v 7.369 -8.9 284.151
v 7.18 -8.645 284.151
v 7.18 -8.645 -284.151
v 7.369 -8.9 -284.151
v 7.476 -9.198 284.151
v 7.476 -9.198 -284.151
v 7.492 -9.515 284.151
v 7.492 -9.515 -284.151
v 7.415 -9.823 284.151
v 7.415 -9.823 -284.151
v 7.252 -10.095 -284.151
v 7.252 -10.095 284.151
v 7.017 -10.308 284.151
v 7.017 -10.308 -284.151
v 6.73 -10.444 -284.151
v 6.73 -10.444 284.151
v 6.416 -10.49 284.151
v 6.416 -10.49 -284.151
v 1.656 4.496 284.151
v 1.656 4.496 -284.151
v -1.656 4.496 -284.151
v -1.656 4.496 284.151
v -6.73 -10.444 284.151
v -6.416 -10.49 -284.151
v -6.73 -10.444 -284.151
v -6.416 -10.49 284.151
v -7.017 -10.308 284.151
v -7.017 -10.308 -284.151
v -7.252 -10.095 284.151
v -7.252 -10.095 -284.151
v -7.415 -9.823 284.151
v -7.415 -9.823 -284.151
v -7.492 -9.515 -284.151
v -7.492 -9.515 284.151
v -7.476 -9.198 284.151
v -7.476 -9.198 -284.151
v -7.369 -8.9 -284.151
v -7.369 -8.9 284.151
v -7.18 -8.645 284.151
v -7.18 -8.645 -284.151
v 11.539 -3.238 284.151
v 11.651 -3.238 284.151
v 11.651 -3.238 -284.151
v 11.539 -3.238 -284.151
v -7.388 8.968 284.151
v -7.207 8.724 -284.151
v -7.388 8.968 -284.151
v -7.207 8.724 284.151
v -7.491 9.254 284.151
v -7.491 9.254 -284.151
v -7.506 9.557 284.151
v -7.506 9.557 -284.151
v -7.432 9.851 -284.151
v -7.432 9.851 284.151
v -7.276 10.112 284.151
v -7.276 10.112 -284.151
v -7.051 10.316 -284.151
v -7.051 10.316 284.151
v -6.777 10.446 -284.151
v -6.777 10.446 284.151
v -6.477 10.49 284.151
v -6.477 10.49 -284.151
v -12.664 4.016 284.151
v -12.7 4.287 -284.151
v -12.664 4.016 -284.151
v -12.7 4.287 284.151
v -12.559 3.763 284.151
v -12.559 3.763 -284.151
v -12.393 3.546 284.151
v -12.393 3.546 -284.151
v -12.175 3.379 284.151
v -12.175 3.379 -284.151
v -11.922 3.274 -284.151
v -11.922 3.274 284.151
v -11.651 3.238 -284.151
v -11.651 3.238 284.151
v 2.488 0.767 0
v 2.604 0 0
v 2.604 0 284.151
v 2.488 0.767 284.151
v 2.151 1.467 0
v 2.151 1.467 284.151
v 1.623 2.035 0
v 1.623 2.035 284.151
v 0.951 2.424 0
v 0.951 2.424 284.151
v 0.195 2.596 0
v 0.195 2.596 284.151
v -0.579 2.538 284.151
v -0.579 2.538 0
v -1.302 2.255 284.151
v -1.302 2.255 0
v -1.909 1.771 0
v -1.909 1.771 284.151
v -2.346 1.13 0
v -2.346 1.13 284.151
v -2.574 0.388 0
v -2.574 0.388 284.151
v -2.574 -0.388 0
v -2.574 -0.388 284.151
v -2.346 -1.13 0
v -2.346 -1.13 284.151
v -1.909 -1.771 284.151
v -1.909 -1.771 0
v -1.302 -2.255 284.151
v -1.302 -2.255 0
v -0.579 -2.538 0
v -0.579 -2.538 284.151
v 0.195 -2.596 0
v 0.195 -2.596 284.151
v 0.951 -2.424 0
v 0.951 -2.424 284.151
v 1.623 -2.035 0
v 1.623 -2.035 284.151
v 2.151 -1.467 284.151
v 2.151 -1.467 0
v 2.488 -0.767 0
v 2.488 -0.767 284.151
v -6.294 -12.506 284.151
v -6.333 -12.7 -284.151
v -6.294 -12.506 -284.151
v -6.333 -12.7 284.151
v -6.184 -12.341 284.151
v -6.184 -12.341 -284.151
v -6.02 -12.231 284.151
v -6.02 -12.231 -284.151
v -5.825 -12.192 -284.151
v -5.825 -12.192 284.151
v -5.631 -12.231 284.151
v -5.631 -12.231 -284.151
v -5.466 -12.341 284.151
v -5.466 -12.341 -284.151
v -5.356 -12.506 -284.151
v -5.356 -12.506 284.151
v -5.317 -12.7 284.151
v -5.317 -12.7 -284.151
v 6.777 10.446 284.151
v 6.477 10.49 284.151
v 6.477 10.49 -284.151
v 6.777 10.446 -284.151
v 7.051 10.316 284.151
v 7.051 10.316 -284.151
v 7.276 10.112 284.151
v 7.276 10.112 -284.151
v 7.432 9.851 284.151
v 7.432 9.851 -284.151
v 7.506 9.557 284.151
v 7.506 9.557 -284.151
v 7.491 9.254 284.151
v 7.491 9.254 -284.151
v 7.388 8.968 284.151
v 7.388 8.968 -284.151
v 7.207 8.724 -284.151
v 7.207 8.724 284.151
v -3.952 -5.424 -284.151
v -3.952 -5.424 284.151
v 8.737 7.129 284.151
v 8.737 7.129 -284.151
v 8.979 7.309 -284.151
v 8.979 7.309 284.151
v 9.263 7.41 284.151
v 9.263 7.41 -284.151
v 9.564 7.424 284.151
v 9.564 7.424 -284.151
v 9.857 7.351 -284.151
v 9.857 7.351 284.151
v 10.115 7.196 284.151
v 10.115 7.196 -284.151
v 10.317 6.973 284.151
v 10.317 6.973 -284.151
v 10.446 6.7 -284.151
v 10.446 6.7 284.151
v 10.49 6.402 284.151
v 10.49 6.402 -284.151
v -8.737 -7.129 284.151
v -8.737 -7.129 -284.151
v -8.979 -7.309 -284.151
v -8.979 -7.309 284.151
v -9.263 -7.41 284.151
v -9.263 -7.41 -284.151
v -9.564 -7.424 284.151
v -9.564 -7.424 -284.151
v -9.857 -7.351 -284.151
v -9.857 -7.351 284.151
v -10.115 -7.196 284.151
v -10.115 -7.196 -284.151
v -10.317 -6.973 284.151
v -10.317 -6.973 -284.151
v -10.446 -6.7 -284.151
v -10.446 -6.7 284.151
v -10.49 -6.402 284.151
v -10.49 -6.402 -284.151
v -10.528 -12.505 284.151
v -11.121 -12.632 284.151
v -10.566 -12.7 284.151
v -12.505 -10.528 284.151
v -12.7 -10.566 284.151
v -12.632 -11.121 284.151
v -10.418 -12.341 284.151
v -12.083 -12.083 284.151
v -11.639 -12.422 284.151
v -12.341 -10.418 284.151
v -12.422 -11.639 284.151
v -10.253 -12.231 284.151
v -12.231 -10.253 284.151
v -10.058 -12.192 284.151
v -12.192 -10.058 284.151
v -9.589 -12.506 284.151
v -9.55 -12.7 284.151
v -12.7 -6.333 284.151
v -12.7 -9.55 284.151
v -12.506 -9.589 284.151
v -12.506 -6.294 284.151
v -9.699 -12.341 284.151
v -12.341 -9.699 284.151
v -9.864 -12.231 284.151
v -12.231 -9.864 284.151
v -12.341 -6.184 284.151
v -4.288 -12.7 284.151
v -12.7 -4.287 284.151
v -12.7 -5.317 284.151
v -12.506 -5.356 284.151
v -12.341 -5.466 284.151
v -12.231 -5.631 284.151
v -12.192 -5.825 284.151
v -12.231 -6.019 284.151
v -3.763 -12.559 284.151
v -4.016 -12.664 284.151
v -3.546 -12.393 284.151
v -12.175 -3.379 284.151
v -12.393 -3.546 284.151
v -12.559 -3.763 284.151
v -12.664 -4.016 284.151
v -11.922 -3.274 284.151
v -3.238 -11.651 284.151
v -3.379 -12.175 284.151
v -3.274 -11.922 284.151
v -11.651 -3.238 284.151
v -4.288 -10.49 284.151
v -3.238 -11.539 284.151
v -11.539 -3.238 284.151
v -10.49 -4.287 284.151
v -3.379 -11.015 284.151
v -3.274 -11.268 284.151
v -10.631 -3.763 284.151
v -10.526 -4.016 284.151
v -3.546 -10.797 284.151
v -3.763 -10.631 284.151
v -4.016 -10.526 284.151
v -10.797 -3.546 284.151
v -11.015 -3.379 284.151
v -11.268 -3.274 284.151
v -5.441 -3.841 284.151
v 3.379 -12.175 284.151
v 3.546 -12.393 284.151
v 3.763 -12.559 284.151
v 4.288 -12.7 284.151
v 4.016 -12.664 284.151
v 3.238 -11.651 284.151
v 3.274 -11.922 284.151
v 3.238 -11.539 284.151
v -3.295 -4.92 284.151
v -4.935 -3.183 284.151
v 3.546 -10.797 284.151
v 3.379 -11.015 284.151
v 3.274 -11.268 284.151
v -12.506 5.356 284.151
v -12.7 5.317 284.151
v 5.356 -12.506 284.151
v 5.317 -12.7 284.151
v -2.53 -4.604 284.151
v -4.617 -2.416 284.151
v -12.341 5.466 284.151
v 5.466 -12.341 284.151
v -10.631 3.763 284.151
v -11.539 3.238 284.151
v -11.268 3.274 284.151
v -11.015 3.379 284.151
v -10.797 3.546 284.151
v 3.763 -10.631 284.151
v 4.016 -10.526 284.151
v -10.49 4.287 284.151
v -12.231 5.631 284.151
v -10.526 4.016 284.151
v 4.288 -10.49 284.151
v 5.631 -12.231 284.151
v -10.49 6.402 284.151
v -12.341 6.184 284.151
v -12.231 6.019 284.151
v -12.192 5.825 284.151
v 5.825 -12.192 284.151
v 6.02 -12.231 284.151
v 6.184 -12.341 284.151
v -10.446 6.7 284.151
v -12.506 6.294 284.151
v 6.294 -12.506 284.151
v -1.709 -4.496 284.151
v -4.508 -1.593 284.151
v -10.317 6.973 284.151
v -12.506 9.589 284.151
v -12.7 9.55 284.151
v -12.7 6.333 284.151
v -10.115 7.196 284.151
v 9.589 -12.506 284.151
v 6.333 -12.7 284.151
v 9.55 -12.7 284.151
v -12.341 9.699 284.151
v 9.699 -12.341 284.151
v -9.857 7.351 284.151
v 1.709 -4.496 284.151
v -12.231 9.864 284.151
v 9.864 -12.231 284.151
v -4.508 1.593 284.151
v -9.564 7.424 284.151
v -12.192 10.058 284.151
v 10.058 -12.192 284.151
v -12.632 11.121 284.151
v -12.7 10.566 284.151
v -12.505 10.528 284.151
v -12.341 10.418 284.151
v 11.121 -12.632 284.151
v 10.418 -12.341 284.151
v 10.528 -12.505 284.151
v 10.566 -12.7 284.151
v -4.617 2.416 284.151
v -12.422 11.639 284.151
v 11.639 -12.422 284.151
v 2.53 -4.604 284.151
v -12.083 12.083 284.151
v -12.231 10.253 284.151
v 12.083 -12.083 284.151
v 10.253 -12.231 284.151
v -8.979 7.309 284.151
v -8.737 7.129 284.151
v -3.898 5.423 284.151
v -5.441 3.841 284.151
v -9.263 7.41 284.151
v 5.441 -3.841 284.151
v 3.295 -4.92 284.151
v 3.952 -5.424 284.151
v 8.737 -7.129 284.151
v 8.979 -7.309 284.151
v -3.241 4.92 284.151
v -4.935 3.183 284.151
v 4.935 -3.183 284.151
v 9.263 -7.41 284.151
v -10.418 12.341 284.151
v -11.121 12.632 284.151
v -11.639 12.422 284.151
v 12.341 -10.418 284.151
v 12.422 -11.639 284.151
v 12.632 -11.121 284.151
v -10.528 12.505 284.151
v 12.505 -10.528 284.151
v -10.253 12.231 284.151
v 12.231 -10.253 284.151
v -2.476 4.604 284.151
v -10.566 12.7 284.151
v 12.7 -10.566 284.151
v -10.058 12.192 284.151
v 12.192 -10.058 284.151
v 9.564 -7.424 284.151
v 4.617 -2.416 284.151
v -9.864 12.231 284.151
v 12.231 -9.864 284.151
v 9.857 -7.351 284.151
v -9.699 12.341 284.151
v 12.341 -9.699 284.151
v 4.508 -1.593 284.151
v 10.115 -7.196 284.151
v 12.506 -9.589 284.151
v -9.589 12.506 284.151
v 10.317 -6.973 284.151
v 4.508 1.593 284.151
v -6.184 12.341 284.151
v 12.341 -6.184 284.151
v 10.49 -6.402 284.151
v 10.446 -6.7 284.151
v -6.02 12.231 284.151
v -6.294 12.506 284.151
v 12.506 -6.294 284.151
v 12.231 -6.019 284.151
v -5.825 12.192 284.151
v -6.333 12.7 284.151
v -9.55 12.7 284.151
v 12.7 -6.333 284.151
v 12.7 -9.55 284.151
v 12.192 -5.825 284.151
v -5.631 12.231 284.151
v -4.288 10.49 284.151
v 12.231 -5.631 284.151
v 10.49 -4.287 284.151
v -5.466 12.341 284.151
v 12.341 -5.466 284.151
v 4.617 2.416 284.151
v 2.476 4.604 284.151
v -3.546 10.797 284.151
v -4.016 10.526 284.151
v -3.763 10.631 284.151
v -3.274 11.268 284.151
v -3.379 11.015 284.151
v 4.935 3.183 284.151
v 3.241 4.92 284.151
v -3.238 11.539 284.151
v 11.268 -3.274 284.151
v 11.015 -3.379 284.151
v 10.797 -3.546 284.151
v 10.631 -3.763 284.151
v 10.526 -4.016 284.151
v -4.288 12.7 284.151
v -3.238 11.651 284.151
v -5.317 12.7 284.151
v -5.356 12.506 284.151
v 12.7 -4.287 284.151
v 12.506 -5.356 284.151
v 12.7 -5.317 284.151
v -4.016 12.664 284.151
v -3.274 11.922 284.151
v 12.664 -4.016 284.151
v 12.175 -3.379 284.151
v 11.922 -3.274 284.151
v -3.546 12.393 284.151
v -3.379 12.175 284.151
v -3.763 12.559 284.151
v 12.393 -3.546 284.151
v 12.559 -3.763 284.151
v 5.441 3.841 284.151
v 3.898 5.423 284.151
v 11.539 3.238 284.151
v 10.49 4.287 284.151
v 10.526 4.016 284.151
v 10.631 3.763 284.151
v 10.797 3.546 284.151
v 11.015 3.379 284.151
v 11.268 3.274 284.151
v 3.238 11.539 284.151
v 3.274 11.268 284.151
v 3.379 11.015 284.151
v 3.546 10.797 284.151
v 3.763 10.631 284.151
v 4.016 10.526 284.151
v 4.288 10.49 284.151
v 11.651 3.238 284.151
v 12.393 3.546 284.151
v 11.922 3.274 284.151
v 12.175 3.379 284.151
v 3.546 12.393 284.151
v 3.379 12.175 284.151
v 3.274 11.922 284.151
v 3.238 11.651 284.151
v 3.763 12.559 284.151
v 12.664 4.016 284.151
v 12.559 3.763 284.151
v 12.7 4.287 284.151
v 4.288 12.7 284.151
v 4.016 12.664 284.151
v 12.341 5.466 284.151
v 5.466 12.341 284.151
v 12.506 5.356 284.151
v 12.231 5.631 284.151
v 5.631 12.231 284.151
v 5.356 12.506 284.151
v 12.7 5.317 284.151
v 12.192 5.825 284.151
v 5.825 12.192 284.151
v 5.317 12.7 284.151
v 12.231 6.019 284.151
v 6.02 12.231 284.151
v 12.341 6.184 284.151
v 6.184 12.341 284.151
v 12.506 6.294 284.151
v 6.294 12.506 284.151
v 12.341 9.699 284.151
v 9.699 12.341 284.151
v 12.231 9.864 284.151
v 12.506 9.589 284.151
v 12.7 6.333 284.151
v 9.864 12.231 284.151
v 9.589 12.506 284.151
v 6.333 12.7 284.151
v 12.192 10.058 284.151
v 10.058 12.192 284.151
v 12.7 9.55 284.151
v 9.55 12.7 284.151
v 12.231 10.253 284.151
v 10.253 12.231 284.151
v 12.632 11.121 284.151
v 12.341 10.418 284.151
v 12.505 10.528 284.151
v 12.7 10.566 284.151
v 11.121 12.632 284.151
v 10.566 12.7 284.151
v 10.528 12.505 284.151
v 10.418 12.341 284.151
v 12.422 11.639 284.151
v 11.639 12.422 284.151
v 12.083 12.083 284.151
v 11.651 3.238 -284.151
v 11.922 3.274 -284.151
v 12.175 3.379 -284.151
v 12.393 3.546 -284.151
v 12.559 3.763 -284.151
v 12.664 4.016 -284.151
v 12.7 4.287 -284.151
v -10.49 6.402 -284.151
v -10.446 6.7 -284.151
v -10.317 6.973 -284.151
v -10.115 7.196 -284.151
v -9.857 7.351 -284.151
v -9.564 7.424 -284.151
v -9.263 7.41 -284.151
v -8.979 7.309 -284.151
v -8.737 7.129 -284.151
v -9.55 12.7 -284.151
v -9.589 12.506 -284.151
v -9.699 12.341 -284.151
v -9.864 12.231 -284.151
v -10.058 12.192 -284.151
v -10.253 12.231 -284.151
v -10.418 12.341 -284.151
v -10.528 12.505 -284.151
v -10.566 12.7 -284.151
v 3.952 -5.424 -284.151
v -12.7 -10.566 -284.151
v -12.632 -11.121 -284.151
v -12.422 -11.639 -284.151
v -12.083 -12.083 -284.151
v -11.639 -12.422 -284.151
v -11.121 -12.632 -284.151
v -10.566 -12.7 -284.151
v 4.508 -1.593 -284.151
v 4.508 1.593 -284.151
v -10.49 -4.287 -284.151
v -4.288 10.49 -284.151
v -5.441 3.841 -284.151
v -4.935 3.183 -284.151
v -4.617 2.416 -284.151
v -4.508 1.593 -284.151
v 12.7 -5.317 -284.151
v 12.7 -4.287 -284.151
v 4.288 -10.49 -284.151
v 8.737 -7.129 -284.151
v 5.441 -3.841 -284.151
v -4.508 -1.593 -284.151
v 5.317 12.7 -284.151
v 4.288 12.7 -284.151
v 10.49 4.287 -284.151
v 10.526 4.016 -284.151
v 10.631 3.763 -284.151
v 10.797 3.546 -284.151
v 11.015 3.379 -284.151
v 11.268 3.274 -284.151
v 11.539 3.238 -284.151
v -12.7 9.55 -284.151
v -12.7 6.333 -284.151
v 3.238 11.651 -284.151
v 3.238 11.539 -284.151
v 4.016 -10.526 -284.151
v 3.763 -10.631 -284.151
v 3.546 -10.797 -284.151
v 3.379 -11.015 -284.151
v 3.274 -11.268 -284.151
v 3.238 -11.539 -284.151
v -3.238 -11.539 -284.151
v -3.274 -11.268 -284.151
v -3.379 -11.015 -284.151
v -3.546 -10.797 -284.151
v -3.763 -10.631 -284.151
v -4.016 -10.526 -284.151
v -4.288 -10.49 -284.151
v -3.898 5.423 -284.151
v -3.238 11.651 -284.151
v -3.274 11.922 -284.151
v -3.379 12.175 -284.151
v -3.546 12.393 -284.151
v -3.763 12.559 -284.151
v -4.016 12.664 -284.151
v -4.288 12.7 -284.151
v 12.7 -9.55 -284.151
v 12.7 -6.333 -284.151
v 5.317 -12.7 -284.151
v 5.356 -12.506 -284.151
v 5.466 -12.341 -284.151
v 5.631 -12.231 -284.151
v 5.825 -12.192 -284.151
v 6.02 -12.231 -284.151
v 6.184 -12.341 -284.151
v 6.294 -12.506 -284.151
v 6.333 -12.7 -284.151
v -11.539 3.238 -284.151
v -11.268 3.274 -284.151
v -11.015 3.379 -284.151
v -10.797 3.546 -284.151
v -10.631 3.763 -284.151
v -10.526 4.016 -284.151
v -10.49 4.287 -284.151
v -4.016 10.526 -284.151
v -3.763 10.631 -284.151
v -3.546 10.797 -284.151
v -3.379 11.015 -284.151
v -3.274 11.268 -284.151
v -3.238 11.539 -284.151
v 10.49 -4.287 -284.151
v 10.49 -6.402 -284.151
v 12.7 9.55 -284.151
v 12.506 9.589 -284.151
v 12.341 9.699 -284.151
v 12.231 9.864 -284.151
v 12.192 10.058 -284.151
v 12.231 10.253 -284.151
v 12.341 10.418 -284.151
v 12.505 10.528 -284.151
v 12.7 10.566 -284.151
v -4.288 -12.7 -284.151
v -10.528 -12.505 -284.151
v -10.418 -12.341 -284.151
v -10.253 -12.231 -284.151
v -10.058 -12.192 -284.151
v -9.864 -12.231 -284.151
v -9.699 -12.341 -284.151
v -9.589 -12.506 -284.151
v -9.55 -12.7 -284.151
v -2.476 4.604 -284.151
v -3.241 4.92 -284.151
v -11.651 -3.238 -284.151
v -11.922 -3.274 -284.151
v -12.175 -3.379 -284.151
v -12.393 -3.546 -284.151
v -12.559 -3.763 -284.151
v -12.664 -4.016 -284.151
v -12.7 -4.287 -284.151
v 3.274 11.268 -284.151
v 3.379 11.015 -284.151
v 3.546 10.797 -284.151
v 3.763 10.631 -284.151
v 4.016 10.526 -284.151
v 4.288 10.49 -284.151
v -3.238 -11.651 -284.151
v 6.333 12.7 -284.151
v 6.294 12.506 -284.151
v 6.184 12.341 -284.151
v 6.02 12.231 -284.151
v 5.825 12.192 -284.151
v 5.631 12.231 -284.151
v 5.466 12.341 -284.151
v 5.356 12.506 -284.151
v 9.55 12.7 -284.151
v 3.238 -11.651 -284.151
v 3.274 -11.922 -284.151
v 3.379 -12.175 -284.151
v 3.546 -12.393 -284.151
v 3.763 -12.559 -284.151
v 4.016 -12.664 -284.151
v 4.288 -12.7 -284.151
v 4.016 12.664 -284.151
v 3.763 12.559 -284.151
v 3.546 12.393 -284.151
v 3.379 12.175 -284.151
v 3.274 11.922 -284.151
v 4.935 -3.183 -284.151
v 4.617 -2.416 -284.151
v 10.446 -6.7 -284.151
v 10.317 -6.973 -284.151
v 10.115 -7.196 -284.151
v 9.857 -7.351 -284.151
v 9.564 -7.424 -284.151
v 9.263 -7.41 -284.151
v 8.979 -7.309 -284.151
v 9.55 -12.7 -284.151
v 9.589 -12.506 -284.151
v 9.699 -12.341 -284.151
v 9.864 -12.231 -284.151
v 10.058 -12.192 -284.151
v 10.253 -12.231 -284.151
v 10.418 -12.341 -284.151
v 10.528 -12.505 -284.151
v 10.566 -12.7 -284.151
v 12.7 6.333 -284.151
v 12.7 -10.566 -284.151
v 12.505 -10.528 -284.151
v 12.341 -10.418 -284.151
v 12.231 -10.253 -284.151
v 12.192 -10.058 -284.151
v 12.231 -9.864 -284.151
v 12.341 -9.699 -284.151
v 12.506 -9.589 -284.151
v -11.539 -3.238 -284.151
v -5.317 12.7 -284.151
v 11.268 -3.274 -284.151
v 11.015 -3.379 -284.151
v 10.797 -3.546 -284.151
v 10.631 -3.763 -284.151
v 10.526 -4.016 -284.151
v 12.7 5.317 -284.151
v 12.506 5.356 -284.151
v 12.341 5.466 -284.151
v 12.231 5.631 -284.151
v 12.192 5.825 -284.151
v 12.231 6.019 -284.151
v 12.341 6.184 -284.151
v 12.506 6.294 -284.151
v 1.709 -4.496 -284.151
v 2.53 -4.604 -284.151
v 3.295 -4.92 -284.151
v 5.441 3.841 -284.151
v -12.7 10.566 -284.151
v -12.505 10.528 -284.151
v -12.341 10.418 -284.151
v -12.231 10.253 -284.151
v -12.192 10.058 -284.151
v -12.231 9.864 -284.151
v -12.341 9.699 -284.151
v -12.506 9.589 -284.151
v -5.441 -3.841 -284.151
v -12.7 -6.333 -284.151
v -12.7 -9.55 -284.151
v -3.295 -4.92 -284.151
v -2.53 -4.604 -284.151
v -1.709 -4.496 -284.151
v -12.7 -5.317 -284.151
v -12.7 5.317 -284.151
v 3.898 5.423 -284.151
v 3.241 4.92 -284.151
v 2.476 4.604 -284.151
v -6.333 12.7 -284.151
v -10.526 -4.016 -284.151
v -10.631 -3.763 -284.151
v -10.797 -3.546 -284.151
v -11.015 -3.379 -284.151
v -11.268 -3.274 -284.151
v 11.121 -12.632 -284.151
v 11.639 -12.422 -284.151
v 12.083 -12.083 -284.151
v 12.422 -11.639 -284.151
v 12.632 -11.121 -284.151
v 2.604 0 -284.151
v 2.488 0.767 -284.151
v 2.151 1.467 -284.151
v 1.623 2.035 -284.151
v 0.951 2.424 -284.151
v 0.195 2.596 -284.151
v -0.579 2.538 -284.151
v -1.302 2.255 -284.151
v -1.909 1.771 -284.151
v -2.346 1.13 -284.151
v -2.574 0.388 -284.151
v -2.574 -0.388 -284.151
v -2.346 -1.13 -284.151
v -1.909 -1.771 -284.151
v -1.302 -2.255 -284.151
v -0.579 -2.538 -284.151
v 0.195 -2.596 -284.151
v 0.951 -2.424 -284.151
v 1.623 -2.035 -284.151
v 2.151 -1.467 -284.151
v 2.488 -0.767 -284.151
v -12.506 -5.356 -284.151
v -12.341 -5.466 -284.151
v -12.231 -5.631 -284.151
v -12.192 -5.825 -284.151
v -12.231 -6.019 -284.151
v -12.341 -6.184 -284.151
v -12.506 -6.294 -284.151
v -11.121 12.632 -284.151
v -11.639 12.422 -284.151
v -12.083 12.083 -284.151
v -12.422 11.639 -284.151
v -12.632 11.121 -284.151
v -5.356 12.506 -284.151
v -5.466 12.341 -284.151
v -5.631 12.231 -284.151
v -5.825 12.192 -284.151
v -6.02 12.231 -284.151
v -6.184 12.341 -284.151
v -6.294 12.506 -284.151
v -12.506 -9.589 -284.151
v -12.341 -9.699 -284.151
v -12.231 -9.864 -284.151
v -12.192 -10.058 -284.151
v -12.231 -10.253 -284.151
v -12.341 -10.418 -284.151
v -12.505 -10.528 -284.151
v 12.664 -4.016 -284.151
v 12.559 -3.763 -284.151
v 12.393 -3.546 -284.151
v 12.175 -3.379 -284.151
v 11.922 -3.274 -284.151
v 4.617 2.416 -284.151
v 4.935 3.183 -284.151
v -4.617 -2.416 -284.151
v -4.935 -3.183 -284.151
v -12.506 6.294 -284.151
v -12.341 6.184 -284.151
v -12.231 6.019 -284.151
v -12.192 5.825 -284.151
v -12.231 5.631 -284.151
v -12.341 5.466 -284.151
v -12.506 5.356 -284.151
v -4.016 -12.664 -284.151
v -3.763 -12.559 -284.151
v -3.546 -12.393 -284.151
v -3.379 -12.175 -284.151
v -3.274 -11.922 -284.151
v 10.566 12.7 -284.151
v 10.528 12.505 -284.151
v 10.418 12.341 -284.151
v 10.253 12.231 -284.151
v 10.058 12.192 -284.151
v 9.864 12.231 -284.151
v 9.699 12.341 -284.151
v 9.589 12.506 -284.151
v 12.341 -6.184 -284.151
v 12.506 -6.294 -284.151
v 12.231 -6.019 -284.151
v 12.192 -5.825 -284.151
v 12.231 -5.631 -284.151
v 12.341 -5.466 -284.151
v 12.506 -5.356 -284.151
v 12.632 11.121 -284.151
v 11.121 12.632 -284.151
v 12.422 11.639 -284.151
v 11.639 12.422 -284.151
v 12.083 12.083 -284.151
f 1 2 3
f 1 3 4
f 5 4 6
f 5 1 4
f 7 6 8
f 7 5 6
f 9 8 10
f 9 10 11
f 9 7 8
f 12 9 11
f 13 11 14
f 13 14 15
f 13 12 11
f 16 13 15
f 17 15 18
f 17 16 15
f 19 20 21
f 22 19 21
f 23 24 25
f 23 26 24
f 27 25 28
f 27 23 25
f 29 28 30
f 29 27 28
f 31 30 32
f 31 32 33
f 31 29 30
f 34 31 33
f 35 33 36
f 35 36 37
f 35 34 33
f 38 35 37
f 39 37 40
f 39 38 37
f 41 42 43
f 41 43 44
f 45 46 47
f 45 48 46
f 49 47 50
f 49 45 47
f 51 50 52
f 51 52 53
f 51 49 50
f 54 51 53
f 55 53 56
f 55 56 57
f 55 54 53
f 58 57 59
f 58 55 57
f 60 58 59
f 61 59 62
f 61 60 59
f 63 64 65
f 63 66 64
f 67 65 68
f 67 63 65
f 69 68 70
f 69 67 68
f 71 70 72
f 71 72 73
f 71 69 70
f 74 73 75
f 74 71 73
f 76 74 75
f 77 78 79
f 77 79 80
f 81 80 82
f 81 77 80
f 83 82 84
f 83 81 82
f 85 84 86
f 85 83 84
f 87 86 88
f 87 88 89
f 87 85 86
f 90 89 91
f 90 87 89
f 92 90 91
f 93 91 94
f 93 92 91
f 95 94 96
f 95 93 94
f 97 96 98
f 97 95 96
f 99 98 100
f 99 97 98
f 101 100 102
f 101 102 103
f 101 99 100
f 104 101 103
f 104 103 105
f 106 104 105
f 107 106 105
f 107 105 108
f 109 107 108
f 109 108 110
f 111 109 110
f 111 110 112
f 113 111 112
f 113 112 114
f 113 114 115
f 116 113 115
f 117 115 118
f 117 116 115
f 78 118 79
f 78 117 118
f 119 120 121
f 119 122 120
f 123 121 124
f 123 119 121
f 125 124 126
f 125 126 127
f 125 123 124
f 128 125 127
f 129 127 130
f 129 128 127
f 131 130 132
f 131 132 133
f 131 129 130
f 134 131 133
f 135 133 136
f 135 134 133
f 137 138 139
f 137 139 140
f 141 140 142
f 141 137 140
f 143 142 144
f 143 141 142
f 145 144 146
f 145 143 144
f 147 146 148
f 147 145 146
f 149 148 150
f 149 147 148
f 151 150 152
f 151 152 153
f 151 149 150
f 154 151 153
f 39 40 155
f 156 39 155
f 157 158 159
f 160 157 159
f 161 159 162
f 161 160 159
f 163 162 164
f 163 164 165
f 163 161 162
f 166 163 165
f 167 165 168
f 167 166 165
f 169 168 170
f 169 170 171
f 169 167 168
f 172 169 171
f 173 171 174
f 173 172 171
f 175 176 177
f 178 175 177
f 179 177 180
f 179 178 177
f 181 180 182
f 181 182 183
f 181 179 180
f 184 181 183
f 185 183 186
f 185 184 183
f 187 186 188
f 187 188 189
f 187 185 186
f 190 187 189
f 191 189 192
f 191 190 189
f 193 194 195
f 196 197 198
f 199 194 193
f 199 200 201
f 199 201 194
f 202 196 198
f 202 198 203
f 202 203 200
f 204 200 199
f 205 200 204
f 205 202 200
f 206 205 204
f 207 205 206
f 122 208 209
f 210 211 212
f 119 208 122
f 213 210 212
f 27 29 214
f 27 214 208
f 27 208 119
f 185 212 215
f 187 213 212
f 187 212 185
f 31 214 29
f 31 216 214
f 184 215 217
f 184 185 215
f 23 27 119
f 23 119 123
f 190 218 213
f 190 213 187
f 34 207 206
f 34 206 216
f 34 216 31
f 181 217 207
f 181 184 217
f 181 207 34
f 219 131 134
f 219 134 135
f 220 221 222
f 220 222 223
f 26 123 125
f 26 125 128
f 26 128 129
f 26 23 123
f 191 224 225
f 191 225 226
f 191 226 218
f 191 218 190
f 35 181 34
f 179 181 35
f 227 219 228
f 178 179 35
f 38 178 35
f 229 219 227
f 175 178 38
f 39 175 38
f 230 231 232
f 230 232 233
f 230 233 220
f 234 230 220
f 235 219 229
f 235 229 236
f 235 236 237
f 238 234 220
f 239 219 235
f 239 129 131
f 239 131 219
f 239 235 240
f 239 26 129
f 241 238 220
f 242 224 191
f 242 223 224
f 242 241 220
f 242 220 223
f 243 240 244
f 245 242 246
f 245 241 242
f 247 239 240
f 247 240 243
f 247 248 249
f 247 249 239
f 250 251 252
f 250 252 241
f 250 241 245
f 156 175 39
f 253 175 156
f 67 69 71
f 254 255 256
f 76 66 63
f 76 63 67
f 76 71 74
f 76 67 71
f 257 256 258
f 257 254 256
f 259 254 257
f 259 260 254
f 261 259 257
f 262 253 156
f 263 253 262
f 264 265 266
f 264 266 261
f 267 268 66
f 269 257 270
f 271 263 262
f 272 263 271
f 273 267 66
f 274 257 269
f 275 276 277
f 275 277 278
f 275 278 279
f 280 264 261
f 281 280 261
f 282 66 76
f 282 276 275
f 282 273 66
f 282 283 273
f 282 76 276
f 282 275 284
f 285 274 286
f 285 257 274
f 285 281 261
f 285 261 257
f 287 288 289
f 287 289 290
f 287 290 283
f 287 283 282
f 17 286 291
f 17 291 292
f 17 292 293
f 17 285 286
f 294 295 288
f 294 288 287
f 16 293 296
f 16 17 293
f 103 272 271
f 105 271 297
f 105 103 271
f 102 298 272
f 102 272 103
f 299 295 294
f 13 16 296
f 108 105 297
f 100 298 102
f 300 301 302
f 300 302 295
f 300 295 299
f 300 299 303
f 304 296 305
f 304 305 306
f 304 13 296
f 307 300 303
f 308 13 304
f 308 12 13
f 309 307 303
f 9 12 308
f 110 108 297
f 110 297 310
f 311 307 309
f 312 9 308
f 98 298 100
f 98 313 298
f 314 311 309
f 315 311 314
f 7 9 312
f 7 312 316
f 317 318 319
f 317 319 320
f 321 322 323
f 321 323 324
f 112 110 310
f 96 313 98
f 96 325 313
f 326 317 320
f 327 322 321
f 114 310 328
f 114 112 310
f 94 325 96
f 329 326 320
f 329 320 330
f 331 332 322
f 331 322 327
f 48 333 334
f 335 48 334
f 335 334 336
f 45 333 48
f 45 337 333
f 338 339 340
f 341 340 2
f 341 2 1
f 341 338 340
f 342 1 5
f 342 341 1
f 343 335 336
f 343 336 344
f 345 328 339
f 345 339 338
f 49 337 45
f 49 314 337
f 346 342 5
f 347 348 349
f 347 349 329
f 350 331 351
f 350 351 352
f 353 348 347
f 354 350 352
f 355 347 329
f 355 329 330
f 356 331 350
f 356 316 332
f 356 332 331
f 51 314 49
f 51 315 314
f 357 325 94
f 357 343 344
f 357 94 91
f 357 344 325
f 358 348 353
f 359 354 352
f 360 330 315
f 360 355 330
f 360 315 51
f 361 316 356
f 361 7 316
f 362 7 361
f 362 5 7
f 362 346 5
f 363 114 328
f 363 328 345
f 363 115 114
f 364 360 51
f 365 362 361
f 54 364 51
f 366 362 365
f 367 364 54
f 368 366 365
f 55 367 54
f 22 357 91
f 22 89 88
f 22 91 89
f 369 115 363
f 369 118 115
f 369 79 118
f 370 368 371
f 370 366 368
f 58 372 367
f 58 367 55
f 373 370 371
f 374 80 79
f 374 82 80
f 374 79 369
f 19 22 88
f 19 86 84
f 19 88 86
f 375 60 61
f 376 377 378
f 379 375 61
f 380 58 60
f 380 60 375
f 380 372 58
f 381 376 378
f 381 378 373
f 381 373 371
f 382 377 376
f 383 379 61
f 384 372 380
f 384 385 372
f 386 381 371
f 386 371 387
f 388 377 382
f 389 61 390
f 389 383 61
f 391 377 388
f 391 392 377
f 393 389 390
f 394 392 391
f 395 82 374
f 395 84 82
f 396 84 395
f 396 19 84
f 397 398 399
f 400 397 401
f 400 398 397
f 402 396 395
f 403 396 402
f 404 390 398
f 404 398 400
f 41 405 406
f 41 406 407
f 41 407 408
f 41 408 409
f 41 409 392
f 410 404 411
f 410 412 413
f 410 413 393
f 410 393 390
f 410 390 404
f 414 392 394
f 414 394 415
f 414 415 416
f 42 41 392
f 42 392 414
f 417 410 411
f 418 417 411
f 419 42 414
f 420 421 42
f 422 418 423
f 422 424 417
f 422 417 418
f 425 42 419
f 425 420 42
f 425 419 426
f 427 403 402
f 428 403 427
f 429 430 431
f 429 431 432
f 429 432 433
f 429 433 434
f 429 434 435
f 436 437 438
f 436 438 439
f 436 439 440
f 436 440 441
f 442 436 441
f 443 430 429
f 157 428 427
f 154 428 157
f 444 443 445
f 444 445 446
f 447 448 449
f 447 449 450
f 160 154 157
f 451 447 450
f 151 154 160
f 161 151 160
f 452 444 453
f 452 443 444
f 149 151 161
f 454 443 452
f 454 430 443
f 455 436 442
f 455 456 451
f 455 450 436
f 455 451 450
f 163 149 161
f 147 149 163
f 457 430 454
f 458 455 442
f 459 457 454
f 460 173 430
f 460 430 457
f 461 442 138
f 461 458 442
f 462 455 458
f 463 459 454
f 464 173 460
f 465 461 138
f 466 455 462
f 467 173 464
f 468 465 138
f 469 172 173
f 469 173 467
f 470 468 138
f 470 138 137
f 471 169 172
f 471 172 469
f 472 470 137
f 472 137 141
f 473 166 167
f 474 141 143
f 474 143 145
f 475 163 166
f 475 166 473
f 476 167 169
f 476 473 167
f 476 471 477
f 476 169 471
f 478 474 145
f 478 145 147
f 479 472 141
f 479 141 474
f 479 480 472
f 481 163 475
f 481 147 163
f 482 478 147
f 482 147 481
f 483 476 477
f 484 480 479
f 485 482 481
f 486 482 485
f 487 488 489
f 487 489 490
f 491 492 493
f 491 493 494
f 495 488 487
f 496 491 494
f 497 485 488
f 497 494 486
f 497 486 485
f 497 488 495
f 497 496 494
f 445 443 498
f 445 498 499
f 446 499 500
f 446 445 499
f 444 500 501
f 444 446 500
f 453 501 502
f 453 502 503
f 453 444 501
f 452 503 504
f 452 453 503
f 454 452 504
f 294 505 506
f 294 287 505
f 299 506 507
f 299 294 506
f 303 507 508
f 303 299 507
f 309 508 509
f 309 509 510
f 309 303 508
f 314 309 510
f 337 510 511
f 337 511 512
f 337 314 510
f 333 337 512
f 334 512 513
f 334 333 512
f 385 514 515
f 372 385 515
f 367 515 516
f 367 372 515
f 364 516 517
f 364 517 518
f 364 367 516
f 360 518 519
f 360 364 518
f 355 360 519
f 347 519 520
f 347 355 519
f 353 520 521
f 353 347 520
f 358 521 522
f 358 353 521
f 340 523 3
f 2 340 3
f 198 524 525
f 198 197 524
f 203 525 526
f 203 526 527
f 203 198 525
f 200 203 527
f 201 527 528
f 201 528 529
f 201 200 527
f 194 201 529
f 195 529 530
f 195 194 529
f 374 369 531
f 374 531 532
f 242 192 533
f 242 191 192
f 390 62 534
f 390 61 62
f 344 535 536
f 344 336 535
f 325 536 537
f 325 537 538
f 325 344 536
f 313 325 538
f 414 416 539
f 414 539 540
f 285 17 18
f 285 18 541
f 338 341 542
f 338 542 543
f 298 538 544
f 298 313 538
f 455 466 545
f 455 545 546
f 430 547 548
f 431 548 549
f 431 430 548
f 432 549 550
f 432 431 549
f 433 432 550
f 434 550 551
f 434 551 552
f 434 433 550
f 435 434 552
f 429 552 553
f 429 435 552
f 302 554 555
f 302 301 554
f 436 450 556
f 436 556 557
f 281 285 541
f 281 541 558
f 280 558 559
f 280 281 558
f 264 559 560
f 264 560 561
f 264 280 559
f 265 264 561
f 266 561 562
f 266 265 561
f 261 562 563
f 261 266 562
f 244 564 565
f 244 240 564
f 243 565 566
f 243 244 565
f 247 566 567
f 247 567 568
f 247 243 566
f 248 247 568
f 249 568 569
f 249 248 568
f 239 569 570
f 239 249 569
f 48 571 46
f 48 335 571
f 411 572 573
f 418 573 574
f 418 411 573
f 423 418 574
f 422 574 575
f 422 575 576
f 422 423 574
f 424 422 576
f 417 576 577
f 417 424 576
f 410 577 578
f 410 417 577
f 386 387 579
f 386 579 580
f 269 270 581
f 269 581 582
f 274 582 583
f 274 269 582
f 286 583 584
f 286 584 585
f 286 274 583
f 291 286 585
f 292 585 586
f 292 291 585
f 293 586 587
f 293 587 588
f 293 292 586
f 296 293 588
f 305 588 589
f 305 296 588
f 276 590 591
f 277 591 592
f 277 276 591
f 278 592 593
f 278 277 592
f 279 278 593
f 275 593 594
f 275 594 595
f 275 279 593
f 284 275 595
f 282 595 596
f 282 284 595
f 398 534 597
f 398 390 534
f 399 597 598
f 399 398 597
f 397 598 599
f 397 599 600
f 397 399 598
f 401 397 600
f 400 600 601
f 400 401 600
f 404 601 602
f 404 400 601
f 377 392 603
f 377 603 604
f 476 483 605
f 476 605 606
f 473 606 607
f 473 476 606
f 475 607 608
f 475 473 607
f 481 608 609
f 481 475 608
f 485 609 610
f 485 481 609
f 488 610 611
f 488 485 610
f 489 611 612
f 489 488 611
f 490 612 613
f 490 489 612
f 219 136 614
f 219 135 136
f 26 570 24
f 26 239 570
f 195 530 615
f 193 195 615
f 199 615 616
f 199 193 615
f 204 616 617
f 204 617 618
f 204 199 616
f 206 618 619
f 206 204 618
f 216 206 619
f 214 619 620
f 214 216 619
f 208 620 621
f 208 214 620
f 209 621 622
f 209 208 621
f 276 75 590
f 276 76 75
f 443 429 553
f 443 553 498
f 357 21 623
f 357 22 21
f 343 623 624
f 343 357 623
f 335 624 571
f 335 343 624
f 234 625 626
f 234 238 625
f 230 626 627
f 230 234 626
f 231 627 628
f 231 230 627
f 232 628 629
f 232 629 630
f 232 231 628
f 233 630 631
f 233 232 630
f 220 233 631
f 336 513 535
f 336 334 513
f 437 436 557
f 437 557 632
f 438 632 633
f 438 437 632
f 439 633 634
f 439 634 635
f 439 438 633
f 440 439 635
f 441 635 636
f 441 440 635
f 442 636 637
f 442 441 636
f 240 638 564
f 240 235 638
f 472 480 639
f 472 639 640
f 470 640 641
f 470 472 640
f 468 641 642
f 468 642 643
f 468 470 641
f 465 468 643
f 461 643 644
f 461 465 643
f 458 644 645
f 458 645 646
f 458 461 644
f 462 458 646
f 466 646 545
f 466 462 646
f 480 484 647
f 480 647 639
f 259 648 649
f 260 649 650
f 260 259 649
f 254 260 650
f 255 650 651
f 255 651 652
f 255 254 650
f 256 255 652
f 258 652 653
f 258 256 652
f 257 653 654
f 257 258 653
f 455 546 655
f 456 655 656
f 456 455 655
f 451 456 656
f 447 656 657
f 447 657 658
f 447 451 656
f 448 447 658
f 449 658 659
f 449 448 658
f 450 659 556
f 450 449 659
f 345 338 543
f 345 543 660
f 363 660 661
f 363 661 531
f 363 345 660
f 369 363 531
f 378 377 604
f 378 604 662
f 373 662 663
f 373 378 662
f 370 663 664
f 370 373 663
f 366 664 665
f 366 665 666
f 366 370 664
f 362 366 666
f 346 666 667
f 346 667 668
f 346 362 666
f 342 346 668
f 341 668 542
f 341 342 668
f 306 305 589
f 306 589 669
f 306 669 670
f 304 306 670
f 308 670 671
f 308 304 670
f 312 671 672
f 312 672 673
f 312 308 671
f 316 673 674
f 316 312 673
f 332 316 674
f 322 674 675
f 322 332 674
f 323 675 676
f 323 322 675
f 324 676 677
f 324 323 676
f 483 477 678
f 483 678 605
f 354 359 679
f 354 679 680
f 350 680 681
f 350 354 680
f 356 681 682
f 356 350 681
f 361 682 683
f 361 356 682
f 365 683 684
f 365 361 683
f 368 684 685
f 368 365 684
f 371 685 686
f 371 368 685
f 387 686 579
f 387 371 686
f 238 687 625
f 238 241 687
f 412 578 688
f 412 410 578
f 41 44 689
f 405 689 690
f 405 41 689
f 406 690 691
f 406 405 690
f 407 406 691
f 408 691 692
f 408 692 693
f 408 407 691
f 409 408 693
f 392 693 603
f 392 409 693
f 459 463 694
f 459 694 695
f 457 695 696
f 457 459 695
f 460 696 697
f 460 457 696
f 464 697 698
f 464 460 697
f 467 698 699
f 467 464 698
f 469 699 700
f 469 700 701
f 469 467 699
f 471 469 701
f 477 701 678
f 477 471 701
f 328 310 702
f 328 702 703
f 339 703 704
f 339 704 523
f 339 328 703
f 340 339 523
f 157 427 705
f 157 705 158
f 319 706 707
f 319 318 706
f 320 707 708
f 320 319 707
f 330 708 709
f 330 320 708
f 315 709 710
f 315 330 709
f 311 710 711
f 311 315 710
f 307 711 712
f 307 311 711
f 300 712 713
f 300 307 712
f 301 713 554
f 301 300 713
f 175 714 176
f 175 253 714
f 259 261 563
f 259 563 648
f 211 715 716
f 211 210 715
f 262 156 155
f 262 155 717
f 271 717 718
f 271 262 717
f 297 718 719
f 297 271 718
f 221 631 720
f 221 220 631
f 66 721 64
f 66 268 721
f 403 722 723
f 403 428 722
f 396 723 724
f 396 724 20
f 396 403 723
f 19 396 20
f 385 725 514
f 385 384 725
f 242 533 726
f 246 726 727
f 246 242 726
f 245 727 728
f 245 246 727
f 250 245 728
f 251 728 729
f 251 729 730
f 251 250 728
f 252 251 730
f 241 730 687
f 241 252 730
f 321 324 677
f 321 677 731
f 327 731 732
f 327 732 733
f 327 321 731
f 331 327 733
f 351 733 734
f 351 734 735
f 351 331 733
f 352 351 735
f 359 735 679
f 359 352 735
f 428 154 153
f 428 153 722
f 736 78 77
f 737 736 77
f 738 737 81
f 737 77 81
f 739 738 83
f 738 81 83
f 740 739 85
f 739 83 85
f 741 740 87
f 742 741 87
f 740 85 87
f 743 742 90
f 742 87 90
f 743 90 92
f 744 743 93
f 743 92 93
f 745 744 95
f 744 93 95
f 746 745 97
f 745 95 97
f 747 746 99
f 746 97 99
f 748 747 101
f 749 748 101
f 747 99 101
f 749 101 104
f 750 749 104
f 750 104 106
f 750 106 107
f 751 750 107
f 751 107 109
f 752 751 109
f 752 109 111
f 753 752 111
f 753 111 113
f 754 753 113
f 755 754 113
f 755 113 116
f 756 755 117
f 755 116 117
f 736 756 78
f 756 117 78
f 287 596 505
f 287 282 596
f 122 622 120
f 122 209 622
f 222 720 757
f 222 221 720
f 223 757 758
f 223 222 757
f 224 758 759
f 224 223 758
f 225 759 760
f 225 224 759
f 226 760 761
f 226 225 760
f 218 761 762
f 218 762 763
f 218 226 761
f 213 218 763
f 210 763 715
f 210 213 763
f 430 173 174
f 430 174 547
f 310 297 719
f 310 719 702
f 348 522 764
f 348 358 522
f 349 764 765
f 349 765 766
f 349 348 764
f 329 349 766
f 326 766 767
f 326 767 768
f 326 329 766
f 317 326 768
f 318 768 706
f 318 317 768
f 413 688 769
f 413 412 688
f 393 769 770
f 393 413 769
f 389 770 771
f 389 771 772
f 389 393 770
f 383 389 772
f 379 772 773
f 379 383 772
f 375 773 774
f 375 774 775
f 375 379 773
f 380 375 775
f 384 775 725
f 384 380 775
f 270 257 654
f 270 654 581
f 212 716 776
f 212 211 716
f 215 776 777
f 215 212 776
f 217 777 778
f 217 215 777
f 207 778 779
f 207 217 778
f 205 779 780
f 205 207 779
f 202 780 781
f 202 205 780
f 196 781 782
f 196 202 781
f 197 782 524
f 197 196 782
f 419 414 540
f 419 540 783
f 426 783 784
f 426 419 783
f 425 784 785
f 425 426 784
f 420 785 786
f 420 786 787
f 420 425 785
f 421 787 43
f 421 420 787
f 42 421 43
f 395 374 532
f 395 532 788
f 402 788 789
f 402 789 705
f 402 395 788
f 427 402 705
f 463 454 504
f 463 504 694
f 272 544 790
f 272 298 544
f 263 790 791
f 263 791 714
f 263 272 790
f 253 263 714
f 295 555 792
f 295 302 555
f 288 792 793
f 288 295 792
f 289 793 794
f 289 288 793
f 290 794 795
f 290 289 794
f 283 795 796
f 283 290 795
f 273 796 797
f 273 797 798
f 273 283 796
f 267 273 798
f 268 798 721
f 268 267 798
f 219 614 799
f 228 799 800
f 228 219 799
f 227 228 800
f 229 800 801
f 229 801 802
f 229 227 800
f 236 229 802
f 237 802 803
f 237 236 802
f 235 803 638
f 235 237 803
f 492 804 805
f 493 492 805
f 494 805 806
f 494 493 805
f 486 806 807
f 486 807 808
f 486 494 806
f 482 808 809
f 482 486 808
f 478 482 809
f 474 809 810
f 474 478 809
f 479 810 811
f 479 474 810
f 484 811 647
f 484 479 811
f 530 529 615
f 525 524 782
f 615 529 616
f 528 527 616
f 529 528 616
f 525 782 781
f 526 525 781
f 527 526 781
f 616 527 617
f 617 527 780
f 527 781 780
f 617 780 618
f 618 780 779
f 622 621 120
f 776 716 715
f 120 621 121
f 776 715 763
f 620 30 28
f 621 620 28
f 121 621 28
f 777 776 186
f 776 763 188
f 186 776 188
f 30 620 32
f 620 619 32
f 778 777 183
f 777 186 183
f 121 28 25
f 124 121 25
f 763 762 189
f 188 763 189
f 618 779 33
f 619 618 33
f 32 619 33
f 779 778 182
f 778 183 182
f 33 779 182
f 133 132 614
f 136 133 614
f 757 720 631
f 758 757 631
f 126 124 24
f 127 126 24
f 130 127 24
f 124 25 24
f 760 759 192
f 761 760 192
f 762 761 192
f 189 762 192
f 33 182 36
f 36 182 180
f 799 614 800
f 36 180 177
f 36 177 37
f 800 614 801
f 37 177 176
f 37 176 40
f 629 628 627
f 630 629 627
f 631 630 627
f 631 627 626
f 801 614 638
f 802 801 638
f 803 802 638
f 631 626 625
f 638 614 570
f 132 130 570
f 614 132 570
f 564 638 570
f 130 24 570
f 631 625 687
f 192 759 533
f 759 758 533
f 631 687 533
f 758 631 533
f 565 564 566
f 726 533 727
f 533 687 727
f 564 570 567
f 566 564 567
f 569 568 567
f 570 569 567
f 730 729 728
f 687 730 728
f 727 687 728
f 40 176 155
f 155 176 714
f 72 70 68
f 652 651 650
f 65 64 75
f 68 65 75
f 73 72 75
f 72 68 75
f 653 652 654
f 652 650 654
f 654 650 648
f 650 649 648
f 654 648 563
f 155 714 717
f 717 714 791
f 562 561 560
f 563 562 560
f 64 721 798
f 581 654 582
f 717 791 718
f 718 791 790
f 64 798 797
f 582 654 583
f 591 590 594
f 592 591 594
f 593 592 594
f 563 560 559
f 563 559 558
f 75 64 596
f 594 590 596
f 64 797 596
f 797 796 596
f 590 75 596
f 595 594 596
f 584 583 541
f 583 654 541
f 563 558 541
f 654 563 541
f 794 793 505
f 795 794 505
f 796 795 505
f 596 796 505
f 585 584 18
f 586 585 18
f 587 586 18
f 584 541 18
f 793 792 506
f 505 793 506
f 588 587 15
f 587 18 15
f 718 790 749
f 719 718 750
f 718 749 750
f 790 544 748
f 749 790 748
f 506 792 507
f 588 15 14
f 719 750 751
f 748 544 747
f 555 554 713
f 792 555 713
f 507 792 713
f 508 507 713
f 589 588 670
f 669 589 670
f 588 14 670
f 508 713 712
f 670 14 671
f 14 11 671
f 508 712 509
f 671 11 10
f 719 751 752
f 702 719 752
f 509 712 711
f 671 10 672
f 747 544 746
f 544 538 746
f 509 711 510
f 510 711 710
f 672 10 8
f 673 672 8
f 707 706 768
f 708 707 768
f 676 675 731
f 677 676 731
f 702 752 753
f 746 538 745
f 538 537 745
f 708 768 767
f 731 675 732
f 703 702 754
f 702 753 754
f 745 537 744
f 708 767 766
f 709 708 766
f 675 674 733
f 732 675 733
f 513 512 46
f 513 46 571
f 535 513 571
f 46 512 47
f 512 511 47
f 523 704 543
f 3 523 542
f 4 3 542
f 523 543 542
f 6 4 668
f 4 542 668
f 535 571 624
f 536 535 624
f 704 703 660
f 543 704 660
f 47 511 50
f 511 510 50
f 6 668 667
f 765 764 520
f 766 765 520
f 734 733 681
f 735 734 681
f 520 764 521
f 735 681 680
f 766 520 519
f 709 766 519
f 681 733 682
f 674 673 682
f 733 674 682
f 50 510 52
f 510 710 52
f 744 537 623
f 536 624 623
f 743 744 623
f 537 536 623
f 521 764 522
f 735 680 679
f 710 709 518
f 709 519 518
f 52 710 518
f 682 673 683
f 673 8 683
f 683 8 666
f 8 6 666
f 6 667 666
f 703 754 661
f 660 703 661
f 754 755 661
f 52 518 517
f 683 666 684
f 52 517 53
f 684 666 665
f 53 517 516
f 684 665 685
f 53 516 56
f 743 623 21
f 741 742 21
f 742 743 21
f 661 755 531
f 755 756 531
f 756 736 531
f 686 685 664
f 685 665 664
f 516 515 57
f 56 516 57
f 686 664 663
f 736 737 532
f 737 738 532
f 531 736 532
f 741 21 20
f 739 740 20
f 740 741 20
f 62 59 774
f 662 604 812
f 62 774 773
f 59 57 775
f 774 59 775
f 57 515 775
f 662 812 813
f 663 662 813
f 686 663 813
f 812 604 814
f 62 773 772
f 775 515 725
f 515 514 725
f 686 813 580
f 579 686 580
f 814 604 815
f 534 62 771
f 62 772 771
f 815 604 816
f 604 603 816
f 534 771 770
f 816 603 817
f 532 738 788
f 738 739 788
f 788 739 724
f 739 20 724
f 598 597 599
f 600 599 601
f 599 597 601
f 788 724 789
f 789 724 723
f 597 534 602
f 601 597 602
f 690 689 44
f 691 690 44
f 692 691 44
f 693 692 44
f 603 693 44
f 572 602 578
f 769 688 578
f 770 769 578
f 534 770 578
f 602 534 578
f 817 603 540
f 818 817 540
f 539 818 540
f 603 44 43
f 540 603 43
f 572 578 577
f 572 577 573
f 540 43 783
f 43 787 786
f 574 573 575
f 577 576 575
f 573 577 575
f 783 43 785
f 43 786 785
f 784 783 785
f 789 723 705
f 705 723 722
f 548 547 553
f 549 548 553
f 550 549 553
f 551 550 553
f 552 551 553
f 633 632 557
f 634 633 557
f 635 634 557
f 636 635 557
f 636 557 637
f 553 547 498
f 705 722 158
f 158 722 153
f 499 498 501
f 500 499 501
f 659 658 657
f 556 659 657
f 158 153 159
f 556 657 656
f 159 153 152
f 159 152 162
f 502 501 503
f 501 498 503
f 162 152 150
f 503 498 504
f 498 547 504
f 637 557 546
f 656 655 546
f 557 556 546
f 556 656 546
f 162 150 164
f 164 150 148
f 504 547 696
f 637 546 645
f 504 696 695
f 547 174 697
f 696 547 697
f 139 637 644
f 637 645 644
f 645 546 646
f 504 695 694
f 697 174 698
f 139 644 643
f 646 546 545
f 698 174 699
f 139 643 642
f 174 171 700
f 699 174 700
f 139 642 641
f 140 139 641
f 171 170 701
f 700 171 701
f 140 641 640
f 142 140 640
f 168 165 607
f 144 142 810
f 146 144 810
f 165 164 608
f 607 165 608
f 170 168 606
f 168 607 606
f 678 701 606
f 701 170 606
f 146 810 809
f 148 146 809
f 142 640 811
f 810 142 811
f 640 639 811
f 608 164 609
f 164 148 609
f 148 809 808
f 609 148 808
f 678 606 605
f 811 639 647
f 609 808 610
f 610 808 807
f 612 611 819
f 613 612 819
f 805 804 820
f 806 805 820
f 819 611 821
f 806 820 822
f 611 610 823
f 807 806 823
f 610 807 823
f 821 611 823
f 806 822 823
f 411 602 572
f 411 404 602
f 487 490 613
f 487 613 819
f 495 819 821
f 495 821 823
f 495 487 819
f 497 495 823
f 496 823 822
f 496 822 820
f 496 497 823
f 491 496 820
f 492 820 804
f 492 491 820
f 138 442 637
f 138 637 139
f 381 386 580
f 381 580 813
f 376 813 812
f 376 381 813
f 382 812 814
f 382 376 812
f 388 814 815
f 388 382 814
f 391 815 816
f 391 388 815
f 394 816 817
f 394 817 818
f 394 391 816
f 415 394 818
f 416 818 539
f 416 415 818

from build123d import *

# Parameters (mm, degrees)
SKETCH3_R                = 2.6035
BOSS_EXTRUDE1_DEPTH      = 284.150642
BOSS_EXTRUDE1_DEPTH_BACK = 284.150642


with BuildPart() as part:
    # Sketch3 → Boss-Extrude1 (new body, two sides)
    with BuildSketch(Plane.XY) as boss_extrude1_sk:
        with BuildLine():
            Line((-7.179650497, -8.645192506), (-3.952270251, -5.423690499))
            ThreePointArc((-3.952270251, -5.423690499), (-2.922936451, -4.736929036), (-1.709253557, -4.4958))
            Line((-1.709253557, -4.4958), (1.709253557, -4.4958))
            ThreePointArc((1.709253557, -4.4958), (2.922936451, -4.736929036), (3.952270251, -5.423690499))
            Line((3.952270251, -5.423690499), (7.179650497, -8.645192506))
            ThreePointArc((7.179650497, -8.645192506), (7.41473083, -9.822813117), (6.416408329, -10.4902))
            Line((6.416408329, -10.4902), (4.287512407, -10.4902))
            ThreePointArc((4.287512407, -10.4902), (3.54574862, -10.79744862), (3.2385, -11.539212407))
            Line((3.2385, -11.539212407), (3.2385, -11.650987593))
            ThreePointArc((3.2385, -11.650987593), (3.54574862, -12.39275138), (4.287512407, -12.7))
            Line((4.287512407, -12.7), (5.317126718, -12.7))
            ThreePointArc((5.317126718, -12.7), (5.825126718, -12.192), (6.333126718, -12.7))
            Line((6.333126718, -12.7), (9.550443118, -12.7))
            ThreePointArc((9.550443118, -12.7), (10.058366869, -12.192000006), (10.566443095, -12.699847501))
            ThreePointArc((10.566443095, -12.699847501), (12.082537762, -12.08250727), (12.699846982, -10.566399977))
            ThreePointArc((12.699846982, -10.566399977), (12.192000006, -10.058323491), (12.7, -9.5504))
            Line((12.7, -9.5504), (12.7, -6.3330836))
            ThreePointArc((12.7, -6.3330836), (12.192, -5.8250836), (12.7, -5.3170836))
            Line((12.7, -5.3170836), (12.7, -4.287469289))
            ThreePointArc((12.7, -4.287469289), (12.39275138, -3.545705502), (11.650987593, -3.238456882))
            Line((11.650987593, -3.238456882), (11.539212407, -3.238456882))
            ThreePointArc((11.539212407, -3.238456882), (10.79744862, -3.545705502), (10.4902, -4.287469289))
            Line((10.4902, -4.287469289), (10.4902, -6.402089023))
            ThreePointArc((10.4902, -6.402089023), (9.856505071, -7.351067942), (8.737131347, -7.129408934))
            Line((8.737131347, -7.129408934), (5.441005833, -3.840816462))
            ThreePointArc((5.441005833, -3.840816462), (4.750877967, -2.809883091), (4.5085, -1.593185507))
            Line((4.5085, -1.593185507), (4.5085, 1.593185507))
            ThreePointArc((4.5085, 1.593185507), (4.750877967, 2.809883091), (5.441005833, 3.840816462))
            Line((5.441005833, 3.840816462), (8.737131347, 7.129408934))
            ThreePointArc((8.737131347, 7.129408934), (9.856505071, 7.351067942), (10.4902, 6.402089023))
            Line((10.4902, 6.402089023), (10.4902, 4.287469289))
            ThreePointArc((10.4902, 4.287469289), (10.79744862, 3.545705502), (11.539212407, 3.238456882))
            Line((11.539212407, 3.238456882), (11.650987593, 3.238456882))
            ThreePointArc((11.650987593, 3.238456882), (12.39275138, 3.545705502), (12.7, 4.287469289))
            Line((12.7, 4.287469289), (12.7, 5.3170836))
            ThreePointArc((12.7, 5.3170836), (12.192, 5.8250836), (12.7, 6.3330836))
            Line((12.7, 6.3330836), (12.7, 9.5504))
            ThreePointArc((12.7, 9.5504), (12.192000006, 10.058323491), (12.699846982, 10.566399977))
            ThreePointArc((12.699846982, 10.566399977), (12.082537762, 12.08250727), (10.566443095, 12.699847501))
            ThreePointArc((10.566443095, 12.699847501), (10.058366869, 12.192000006), (9.550443118, 12.7))
            Line((9.550443118, 12.7), (6.333126718, 12.7))
            ThreePointArc((6.333126718, 12.7), (5.825126718, 12.192), (5.317126718, 12.7))
            Line((5.317126718, 12.7), (4.287512407, 12.7))
            ThreePointArc((4.287512407, 12.7), (3.54574862, 12.39275138), (3.2385, 11.650987593))
            Line((3.2385, 11.650987593), (3.2385, 11.539212407))
            ThreePointArc((3.2385, 11.539212407), (3.54574862, 10.79744862), (4.287512407, 10.4902))
            Line((4.287512407, 10.4902), (6.476788598, 10.4902))
            ThreePointArc((6.476788598, 10.4902), (7.432222385, 9.85140422), (7.207036008, 8.724370562))
            Line((7.207036008, 8.724370562), (3.898272566, 5.423169045))
            ThreePointArc((3.898272566, 5.423169045), (2.869120213, 4.736787962), (1.655778399, 4.4958))
            Line((1.655778399, 4.4958), (-1.655778399, 4.4958))
            ThreePointArc((-1.655778399, 4.4958), (-2.869120213, 4.736787962), (-3.898272566, 5.423169045))
            Line((-3.898272566, 5.423169045), (-7.207036008, 8.724370562))
            ThreePointArc((-7.207036008, 8.724370562), (-7.432222385, 9.85140422), (-6.476788598, 10.4902))
            Line((-6.476788598, 10.4902), (-4.287512407, 10.4902))
            ThreePointArc((-4.287512407, 10.4902), (-3.54574862, 10.79744862), (-3.2385, 11.539212407))
            Line((-3.2385, 11.539212407), (-3.2385, 11.650987593))
            ThreePointArc((-3.2385, 11.650987593), (-3.54574862, 12.39275138), (-4.287512407, 12.7))
            Line((-4.287512407, 12.7), (-5.317126718, 12.7))
            ThreePointArc((-5.317126718, 12.7), (-5.825126718, 12.192), (-6.333126718, 12.7))
            Line((-6.333126718, 12.7), (-9.550443118, 12.7))
            ThreePointArc((-9.550443118, 12.7), (-10.058366869, 12.192000006), (-10.566443095, 12.699847501))
            ThreePointArc((-10.566443095, 12.699847501), (-12.082537762, 12.08250727), (-12.699846982, 10.566399977))
            ThreePointArc((-12.699846982, 10.566399977), (-12.192000006, 10.058323491), (-12.7, 9.5504))
            Line((-12.7, 9.5504), (-12.7, 6.3330836))
            ThreePointArc((-12.7, 6.3330836), (-12.192, 5.8250836), (-12.7, 5.3170836))
            Line((-12.7, 5.3170836), (-12.7, 4.287469289))
            ThreePointArc((-12.7, 4.287469289), (-12.39275138, 3.545705502), (-11.650987593, 3.238456882))
            Line((-11.650987593, 3.238456882), (-11.539212407, 3.238456882))
            ThreePointArc((-11.539212407, 3.238456882), (-10.79744862, 3.545705502), (-10.4902, 4.287469289))
            Line((-10.4902, 4.287469289), (-10.4902, 6.402089023))
            ThreePointArc((-10.4902, 6.402089023), (-9.856505071, 7.351067942), (-8.737131347, 7.129408934))
            Line((-8.737131347, 7.129408934), (-5.441005833, 3.840816462))
            ThreePointArc((-5.441005833, 3.840816462), (-4.750877967, 2.809883091), (-4.5085, 1.593185507))
            Line((-4.5085, 1.593185507), (-4.5085, -1.593185507))
            ThreePointArc((-4.5085, -1.593185507), (-4.750877967, -2.809883091), (-5.441005833, -3.840816462))
            Line((-5.441005833, -3.840816462), (-8.737131347, -7.129408934))
            ThreePointArc((-8.737131347, -7.129408934), (-9.856505071, -7.351067942), (-10.4902, -6.402089023))
            Line((-10.4902, -6.402089023), (-10.4902, -4.287469289))
            ThreePointArc((-10.4902, -4.287469289), (-10.79744862, -3.545705502), (-11.539212407, -3.238456882))
            Line((-11.539212407, -3.238456882), (-11.650987593, -3.238456882))
            ThreePointArc((-11.650987593, -3.238456882), (-12.39275138, -3.545705502), (-12.7, -4.287469289))
            Line((-12.7, -4.287469289), (-12.7, -5.3170836))
            ThreePointArc((-12.7, -5.3170836), (-12.192, -5.8250836), (-12.7, -6.3330836))
            Line((-12.7, -6.3330836), (-12.7, -9.5504))
            ThreePointArc((-12.7, -9.5504), (-12.192000006, -10.058323491), (-12.699846982, -10.566399977))
            ThreePointArc((-12.699846982, -10.566399977), (-12.082537762, -12.08250727), (-10.566443095, -12.699847501))
            ThreePointArc((-10.566443095, -12.699847501), (-10.058366869, -12.192000006), (-9.550443118, -12.7))
            Line((-9.550443118, -12.7), (-6.333126718, -12.7))
            ThreePointArc((-6.333126718, -12.7), (-5.825126718, -12.192), (-5.317126718, -12.7))
            Line((-5.317126718, -12.7), (-4.287512407, -12.7))
            ThreePointArc((-4.287512407, -12.7), (-3.54574862, -12.39275138), (-3.2385, -11.650987593))
            Line((-3.2385, -11.650987593), (-3.2385, -11.539212407))
            ThreePointArc((-3.2385, -11.539212407), (-3.54574862, -10.79744862), (-4.287512407, -10.4902))
            Line((-4.287512407, -10.4902), (-6.416408329, -10.4902))
            ThreePointArc((-6.416408329, -10.4902), (-7.41473083, -9.822813117), (-7.179650497, -8.645192506))
        make_face()
        Circle(SKETCH3_R, mode=Mode.SUBTRACT)
    extrude(amount=BOSS_EXTRUDE1_DEPTH)
    extrude(boss_extrude1_sk.sketch, amount=-BOSS_EXTRUDE1_DEPTH_BACK)


solid = part.part
